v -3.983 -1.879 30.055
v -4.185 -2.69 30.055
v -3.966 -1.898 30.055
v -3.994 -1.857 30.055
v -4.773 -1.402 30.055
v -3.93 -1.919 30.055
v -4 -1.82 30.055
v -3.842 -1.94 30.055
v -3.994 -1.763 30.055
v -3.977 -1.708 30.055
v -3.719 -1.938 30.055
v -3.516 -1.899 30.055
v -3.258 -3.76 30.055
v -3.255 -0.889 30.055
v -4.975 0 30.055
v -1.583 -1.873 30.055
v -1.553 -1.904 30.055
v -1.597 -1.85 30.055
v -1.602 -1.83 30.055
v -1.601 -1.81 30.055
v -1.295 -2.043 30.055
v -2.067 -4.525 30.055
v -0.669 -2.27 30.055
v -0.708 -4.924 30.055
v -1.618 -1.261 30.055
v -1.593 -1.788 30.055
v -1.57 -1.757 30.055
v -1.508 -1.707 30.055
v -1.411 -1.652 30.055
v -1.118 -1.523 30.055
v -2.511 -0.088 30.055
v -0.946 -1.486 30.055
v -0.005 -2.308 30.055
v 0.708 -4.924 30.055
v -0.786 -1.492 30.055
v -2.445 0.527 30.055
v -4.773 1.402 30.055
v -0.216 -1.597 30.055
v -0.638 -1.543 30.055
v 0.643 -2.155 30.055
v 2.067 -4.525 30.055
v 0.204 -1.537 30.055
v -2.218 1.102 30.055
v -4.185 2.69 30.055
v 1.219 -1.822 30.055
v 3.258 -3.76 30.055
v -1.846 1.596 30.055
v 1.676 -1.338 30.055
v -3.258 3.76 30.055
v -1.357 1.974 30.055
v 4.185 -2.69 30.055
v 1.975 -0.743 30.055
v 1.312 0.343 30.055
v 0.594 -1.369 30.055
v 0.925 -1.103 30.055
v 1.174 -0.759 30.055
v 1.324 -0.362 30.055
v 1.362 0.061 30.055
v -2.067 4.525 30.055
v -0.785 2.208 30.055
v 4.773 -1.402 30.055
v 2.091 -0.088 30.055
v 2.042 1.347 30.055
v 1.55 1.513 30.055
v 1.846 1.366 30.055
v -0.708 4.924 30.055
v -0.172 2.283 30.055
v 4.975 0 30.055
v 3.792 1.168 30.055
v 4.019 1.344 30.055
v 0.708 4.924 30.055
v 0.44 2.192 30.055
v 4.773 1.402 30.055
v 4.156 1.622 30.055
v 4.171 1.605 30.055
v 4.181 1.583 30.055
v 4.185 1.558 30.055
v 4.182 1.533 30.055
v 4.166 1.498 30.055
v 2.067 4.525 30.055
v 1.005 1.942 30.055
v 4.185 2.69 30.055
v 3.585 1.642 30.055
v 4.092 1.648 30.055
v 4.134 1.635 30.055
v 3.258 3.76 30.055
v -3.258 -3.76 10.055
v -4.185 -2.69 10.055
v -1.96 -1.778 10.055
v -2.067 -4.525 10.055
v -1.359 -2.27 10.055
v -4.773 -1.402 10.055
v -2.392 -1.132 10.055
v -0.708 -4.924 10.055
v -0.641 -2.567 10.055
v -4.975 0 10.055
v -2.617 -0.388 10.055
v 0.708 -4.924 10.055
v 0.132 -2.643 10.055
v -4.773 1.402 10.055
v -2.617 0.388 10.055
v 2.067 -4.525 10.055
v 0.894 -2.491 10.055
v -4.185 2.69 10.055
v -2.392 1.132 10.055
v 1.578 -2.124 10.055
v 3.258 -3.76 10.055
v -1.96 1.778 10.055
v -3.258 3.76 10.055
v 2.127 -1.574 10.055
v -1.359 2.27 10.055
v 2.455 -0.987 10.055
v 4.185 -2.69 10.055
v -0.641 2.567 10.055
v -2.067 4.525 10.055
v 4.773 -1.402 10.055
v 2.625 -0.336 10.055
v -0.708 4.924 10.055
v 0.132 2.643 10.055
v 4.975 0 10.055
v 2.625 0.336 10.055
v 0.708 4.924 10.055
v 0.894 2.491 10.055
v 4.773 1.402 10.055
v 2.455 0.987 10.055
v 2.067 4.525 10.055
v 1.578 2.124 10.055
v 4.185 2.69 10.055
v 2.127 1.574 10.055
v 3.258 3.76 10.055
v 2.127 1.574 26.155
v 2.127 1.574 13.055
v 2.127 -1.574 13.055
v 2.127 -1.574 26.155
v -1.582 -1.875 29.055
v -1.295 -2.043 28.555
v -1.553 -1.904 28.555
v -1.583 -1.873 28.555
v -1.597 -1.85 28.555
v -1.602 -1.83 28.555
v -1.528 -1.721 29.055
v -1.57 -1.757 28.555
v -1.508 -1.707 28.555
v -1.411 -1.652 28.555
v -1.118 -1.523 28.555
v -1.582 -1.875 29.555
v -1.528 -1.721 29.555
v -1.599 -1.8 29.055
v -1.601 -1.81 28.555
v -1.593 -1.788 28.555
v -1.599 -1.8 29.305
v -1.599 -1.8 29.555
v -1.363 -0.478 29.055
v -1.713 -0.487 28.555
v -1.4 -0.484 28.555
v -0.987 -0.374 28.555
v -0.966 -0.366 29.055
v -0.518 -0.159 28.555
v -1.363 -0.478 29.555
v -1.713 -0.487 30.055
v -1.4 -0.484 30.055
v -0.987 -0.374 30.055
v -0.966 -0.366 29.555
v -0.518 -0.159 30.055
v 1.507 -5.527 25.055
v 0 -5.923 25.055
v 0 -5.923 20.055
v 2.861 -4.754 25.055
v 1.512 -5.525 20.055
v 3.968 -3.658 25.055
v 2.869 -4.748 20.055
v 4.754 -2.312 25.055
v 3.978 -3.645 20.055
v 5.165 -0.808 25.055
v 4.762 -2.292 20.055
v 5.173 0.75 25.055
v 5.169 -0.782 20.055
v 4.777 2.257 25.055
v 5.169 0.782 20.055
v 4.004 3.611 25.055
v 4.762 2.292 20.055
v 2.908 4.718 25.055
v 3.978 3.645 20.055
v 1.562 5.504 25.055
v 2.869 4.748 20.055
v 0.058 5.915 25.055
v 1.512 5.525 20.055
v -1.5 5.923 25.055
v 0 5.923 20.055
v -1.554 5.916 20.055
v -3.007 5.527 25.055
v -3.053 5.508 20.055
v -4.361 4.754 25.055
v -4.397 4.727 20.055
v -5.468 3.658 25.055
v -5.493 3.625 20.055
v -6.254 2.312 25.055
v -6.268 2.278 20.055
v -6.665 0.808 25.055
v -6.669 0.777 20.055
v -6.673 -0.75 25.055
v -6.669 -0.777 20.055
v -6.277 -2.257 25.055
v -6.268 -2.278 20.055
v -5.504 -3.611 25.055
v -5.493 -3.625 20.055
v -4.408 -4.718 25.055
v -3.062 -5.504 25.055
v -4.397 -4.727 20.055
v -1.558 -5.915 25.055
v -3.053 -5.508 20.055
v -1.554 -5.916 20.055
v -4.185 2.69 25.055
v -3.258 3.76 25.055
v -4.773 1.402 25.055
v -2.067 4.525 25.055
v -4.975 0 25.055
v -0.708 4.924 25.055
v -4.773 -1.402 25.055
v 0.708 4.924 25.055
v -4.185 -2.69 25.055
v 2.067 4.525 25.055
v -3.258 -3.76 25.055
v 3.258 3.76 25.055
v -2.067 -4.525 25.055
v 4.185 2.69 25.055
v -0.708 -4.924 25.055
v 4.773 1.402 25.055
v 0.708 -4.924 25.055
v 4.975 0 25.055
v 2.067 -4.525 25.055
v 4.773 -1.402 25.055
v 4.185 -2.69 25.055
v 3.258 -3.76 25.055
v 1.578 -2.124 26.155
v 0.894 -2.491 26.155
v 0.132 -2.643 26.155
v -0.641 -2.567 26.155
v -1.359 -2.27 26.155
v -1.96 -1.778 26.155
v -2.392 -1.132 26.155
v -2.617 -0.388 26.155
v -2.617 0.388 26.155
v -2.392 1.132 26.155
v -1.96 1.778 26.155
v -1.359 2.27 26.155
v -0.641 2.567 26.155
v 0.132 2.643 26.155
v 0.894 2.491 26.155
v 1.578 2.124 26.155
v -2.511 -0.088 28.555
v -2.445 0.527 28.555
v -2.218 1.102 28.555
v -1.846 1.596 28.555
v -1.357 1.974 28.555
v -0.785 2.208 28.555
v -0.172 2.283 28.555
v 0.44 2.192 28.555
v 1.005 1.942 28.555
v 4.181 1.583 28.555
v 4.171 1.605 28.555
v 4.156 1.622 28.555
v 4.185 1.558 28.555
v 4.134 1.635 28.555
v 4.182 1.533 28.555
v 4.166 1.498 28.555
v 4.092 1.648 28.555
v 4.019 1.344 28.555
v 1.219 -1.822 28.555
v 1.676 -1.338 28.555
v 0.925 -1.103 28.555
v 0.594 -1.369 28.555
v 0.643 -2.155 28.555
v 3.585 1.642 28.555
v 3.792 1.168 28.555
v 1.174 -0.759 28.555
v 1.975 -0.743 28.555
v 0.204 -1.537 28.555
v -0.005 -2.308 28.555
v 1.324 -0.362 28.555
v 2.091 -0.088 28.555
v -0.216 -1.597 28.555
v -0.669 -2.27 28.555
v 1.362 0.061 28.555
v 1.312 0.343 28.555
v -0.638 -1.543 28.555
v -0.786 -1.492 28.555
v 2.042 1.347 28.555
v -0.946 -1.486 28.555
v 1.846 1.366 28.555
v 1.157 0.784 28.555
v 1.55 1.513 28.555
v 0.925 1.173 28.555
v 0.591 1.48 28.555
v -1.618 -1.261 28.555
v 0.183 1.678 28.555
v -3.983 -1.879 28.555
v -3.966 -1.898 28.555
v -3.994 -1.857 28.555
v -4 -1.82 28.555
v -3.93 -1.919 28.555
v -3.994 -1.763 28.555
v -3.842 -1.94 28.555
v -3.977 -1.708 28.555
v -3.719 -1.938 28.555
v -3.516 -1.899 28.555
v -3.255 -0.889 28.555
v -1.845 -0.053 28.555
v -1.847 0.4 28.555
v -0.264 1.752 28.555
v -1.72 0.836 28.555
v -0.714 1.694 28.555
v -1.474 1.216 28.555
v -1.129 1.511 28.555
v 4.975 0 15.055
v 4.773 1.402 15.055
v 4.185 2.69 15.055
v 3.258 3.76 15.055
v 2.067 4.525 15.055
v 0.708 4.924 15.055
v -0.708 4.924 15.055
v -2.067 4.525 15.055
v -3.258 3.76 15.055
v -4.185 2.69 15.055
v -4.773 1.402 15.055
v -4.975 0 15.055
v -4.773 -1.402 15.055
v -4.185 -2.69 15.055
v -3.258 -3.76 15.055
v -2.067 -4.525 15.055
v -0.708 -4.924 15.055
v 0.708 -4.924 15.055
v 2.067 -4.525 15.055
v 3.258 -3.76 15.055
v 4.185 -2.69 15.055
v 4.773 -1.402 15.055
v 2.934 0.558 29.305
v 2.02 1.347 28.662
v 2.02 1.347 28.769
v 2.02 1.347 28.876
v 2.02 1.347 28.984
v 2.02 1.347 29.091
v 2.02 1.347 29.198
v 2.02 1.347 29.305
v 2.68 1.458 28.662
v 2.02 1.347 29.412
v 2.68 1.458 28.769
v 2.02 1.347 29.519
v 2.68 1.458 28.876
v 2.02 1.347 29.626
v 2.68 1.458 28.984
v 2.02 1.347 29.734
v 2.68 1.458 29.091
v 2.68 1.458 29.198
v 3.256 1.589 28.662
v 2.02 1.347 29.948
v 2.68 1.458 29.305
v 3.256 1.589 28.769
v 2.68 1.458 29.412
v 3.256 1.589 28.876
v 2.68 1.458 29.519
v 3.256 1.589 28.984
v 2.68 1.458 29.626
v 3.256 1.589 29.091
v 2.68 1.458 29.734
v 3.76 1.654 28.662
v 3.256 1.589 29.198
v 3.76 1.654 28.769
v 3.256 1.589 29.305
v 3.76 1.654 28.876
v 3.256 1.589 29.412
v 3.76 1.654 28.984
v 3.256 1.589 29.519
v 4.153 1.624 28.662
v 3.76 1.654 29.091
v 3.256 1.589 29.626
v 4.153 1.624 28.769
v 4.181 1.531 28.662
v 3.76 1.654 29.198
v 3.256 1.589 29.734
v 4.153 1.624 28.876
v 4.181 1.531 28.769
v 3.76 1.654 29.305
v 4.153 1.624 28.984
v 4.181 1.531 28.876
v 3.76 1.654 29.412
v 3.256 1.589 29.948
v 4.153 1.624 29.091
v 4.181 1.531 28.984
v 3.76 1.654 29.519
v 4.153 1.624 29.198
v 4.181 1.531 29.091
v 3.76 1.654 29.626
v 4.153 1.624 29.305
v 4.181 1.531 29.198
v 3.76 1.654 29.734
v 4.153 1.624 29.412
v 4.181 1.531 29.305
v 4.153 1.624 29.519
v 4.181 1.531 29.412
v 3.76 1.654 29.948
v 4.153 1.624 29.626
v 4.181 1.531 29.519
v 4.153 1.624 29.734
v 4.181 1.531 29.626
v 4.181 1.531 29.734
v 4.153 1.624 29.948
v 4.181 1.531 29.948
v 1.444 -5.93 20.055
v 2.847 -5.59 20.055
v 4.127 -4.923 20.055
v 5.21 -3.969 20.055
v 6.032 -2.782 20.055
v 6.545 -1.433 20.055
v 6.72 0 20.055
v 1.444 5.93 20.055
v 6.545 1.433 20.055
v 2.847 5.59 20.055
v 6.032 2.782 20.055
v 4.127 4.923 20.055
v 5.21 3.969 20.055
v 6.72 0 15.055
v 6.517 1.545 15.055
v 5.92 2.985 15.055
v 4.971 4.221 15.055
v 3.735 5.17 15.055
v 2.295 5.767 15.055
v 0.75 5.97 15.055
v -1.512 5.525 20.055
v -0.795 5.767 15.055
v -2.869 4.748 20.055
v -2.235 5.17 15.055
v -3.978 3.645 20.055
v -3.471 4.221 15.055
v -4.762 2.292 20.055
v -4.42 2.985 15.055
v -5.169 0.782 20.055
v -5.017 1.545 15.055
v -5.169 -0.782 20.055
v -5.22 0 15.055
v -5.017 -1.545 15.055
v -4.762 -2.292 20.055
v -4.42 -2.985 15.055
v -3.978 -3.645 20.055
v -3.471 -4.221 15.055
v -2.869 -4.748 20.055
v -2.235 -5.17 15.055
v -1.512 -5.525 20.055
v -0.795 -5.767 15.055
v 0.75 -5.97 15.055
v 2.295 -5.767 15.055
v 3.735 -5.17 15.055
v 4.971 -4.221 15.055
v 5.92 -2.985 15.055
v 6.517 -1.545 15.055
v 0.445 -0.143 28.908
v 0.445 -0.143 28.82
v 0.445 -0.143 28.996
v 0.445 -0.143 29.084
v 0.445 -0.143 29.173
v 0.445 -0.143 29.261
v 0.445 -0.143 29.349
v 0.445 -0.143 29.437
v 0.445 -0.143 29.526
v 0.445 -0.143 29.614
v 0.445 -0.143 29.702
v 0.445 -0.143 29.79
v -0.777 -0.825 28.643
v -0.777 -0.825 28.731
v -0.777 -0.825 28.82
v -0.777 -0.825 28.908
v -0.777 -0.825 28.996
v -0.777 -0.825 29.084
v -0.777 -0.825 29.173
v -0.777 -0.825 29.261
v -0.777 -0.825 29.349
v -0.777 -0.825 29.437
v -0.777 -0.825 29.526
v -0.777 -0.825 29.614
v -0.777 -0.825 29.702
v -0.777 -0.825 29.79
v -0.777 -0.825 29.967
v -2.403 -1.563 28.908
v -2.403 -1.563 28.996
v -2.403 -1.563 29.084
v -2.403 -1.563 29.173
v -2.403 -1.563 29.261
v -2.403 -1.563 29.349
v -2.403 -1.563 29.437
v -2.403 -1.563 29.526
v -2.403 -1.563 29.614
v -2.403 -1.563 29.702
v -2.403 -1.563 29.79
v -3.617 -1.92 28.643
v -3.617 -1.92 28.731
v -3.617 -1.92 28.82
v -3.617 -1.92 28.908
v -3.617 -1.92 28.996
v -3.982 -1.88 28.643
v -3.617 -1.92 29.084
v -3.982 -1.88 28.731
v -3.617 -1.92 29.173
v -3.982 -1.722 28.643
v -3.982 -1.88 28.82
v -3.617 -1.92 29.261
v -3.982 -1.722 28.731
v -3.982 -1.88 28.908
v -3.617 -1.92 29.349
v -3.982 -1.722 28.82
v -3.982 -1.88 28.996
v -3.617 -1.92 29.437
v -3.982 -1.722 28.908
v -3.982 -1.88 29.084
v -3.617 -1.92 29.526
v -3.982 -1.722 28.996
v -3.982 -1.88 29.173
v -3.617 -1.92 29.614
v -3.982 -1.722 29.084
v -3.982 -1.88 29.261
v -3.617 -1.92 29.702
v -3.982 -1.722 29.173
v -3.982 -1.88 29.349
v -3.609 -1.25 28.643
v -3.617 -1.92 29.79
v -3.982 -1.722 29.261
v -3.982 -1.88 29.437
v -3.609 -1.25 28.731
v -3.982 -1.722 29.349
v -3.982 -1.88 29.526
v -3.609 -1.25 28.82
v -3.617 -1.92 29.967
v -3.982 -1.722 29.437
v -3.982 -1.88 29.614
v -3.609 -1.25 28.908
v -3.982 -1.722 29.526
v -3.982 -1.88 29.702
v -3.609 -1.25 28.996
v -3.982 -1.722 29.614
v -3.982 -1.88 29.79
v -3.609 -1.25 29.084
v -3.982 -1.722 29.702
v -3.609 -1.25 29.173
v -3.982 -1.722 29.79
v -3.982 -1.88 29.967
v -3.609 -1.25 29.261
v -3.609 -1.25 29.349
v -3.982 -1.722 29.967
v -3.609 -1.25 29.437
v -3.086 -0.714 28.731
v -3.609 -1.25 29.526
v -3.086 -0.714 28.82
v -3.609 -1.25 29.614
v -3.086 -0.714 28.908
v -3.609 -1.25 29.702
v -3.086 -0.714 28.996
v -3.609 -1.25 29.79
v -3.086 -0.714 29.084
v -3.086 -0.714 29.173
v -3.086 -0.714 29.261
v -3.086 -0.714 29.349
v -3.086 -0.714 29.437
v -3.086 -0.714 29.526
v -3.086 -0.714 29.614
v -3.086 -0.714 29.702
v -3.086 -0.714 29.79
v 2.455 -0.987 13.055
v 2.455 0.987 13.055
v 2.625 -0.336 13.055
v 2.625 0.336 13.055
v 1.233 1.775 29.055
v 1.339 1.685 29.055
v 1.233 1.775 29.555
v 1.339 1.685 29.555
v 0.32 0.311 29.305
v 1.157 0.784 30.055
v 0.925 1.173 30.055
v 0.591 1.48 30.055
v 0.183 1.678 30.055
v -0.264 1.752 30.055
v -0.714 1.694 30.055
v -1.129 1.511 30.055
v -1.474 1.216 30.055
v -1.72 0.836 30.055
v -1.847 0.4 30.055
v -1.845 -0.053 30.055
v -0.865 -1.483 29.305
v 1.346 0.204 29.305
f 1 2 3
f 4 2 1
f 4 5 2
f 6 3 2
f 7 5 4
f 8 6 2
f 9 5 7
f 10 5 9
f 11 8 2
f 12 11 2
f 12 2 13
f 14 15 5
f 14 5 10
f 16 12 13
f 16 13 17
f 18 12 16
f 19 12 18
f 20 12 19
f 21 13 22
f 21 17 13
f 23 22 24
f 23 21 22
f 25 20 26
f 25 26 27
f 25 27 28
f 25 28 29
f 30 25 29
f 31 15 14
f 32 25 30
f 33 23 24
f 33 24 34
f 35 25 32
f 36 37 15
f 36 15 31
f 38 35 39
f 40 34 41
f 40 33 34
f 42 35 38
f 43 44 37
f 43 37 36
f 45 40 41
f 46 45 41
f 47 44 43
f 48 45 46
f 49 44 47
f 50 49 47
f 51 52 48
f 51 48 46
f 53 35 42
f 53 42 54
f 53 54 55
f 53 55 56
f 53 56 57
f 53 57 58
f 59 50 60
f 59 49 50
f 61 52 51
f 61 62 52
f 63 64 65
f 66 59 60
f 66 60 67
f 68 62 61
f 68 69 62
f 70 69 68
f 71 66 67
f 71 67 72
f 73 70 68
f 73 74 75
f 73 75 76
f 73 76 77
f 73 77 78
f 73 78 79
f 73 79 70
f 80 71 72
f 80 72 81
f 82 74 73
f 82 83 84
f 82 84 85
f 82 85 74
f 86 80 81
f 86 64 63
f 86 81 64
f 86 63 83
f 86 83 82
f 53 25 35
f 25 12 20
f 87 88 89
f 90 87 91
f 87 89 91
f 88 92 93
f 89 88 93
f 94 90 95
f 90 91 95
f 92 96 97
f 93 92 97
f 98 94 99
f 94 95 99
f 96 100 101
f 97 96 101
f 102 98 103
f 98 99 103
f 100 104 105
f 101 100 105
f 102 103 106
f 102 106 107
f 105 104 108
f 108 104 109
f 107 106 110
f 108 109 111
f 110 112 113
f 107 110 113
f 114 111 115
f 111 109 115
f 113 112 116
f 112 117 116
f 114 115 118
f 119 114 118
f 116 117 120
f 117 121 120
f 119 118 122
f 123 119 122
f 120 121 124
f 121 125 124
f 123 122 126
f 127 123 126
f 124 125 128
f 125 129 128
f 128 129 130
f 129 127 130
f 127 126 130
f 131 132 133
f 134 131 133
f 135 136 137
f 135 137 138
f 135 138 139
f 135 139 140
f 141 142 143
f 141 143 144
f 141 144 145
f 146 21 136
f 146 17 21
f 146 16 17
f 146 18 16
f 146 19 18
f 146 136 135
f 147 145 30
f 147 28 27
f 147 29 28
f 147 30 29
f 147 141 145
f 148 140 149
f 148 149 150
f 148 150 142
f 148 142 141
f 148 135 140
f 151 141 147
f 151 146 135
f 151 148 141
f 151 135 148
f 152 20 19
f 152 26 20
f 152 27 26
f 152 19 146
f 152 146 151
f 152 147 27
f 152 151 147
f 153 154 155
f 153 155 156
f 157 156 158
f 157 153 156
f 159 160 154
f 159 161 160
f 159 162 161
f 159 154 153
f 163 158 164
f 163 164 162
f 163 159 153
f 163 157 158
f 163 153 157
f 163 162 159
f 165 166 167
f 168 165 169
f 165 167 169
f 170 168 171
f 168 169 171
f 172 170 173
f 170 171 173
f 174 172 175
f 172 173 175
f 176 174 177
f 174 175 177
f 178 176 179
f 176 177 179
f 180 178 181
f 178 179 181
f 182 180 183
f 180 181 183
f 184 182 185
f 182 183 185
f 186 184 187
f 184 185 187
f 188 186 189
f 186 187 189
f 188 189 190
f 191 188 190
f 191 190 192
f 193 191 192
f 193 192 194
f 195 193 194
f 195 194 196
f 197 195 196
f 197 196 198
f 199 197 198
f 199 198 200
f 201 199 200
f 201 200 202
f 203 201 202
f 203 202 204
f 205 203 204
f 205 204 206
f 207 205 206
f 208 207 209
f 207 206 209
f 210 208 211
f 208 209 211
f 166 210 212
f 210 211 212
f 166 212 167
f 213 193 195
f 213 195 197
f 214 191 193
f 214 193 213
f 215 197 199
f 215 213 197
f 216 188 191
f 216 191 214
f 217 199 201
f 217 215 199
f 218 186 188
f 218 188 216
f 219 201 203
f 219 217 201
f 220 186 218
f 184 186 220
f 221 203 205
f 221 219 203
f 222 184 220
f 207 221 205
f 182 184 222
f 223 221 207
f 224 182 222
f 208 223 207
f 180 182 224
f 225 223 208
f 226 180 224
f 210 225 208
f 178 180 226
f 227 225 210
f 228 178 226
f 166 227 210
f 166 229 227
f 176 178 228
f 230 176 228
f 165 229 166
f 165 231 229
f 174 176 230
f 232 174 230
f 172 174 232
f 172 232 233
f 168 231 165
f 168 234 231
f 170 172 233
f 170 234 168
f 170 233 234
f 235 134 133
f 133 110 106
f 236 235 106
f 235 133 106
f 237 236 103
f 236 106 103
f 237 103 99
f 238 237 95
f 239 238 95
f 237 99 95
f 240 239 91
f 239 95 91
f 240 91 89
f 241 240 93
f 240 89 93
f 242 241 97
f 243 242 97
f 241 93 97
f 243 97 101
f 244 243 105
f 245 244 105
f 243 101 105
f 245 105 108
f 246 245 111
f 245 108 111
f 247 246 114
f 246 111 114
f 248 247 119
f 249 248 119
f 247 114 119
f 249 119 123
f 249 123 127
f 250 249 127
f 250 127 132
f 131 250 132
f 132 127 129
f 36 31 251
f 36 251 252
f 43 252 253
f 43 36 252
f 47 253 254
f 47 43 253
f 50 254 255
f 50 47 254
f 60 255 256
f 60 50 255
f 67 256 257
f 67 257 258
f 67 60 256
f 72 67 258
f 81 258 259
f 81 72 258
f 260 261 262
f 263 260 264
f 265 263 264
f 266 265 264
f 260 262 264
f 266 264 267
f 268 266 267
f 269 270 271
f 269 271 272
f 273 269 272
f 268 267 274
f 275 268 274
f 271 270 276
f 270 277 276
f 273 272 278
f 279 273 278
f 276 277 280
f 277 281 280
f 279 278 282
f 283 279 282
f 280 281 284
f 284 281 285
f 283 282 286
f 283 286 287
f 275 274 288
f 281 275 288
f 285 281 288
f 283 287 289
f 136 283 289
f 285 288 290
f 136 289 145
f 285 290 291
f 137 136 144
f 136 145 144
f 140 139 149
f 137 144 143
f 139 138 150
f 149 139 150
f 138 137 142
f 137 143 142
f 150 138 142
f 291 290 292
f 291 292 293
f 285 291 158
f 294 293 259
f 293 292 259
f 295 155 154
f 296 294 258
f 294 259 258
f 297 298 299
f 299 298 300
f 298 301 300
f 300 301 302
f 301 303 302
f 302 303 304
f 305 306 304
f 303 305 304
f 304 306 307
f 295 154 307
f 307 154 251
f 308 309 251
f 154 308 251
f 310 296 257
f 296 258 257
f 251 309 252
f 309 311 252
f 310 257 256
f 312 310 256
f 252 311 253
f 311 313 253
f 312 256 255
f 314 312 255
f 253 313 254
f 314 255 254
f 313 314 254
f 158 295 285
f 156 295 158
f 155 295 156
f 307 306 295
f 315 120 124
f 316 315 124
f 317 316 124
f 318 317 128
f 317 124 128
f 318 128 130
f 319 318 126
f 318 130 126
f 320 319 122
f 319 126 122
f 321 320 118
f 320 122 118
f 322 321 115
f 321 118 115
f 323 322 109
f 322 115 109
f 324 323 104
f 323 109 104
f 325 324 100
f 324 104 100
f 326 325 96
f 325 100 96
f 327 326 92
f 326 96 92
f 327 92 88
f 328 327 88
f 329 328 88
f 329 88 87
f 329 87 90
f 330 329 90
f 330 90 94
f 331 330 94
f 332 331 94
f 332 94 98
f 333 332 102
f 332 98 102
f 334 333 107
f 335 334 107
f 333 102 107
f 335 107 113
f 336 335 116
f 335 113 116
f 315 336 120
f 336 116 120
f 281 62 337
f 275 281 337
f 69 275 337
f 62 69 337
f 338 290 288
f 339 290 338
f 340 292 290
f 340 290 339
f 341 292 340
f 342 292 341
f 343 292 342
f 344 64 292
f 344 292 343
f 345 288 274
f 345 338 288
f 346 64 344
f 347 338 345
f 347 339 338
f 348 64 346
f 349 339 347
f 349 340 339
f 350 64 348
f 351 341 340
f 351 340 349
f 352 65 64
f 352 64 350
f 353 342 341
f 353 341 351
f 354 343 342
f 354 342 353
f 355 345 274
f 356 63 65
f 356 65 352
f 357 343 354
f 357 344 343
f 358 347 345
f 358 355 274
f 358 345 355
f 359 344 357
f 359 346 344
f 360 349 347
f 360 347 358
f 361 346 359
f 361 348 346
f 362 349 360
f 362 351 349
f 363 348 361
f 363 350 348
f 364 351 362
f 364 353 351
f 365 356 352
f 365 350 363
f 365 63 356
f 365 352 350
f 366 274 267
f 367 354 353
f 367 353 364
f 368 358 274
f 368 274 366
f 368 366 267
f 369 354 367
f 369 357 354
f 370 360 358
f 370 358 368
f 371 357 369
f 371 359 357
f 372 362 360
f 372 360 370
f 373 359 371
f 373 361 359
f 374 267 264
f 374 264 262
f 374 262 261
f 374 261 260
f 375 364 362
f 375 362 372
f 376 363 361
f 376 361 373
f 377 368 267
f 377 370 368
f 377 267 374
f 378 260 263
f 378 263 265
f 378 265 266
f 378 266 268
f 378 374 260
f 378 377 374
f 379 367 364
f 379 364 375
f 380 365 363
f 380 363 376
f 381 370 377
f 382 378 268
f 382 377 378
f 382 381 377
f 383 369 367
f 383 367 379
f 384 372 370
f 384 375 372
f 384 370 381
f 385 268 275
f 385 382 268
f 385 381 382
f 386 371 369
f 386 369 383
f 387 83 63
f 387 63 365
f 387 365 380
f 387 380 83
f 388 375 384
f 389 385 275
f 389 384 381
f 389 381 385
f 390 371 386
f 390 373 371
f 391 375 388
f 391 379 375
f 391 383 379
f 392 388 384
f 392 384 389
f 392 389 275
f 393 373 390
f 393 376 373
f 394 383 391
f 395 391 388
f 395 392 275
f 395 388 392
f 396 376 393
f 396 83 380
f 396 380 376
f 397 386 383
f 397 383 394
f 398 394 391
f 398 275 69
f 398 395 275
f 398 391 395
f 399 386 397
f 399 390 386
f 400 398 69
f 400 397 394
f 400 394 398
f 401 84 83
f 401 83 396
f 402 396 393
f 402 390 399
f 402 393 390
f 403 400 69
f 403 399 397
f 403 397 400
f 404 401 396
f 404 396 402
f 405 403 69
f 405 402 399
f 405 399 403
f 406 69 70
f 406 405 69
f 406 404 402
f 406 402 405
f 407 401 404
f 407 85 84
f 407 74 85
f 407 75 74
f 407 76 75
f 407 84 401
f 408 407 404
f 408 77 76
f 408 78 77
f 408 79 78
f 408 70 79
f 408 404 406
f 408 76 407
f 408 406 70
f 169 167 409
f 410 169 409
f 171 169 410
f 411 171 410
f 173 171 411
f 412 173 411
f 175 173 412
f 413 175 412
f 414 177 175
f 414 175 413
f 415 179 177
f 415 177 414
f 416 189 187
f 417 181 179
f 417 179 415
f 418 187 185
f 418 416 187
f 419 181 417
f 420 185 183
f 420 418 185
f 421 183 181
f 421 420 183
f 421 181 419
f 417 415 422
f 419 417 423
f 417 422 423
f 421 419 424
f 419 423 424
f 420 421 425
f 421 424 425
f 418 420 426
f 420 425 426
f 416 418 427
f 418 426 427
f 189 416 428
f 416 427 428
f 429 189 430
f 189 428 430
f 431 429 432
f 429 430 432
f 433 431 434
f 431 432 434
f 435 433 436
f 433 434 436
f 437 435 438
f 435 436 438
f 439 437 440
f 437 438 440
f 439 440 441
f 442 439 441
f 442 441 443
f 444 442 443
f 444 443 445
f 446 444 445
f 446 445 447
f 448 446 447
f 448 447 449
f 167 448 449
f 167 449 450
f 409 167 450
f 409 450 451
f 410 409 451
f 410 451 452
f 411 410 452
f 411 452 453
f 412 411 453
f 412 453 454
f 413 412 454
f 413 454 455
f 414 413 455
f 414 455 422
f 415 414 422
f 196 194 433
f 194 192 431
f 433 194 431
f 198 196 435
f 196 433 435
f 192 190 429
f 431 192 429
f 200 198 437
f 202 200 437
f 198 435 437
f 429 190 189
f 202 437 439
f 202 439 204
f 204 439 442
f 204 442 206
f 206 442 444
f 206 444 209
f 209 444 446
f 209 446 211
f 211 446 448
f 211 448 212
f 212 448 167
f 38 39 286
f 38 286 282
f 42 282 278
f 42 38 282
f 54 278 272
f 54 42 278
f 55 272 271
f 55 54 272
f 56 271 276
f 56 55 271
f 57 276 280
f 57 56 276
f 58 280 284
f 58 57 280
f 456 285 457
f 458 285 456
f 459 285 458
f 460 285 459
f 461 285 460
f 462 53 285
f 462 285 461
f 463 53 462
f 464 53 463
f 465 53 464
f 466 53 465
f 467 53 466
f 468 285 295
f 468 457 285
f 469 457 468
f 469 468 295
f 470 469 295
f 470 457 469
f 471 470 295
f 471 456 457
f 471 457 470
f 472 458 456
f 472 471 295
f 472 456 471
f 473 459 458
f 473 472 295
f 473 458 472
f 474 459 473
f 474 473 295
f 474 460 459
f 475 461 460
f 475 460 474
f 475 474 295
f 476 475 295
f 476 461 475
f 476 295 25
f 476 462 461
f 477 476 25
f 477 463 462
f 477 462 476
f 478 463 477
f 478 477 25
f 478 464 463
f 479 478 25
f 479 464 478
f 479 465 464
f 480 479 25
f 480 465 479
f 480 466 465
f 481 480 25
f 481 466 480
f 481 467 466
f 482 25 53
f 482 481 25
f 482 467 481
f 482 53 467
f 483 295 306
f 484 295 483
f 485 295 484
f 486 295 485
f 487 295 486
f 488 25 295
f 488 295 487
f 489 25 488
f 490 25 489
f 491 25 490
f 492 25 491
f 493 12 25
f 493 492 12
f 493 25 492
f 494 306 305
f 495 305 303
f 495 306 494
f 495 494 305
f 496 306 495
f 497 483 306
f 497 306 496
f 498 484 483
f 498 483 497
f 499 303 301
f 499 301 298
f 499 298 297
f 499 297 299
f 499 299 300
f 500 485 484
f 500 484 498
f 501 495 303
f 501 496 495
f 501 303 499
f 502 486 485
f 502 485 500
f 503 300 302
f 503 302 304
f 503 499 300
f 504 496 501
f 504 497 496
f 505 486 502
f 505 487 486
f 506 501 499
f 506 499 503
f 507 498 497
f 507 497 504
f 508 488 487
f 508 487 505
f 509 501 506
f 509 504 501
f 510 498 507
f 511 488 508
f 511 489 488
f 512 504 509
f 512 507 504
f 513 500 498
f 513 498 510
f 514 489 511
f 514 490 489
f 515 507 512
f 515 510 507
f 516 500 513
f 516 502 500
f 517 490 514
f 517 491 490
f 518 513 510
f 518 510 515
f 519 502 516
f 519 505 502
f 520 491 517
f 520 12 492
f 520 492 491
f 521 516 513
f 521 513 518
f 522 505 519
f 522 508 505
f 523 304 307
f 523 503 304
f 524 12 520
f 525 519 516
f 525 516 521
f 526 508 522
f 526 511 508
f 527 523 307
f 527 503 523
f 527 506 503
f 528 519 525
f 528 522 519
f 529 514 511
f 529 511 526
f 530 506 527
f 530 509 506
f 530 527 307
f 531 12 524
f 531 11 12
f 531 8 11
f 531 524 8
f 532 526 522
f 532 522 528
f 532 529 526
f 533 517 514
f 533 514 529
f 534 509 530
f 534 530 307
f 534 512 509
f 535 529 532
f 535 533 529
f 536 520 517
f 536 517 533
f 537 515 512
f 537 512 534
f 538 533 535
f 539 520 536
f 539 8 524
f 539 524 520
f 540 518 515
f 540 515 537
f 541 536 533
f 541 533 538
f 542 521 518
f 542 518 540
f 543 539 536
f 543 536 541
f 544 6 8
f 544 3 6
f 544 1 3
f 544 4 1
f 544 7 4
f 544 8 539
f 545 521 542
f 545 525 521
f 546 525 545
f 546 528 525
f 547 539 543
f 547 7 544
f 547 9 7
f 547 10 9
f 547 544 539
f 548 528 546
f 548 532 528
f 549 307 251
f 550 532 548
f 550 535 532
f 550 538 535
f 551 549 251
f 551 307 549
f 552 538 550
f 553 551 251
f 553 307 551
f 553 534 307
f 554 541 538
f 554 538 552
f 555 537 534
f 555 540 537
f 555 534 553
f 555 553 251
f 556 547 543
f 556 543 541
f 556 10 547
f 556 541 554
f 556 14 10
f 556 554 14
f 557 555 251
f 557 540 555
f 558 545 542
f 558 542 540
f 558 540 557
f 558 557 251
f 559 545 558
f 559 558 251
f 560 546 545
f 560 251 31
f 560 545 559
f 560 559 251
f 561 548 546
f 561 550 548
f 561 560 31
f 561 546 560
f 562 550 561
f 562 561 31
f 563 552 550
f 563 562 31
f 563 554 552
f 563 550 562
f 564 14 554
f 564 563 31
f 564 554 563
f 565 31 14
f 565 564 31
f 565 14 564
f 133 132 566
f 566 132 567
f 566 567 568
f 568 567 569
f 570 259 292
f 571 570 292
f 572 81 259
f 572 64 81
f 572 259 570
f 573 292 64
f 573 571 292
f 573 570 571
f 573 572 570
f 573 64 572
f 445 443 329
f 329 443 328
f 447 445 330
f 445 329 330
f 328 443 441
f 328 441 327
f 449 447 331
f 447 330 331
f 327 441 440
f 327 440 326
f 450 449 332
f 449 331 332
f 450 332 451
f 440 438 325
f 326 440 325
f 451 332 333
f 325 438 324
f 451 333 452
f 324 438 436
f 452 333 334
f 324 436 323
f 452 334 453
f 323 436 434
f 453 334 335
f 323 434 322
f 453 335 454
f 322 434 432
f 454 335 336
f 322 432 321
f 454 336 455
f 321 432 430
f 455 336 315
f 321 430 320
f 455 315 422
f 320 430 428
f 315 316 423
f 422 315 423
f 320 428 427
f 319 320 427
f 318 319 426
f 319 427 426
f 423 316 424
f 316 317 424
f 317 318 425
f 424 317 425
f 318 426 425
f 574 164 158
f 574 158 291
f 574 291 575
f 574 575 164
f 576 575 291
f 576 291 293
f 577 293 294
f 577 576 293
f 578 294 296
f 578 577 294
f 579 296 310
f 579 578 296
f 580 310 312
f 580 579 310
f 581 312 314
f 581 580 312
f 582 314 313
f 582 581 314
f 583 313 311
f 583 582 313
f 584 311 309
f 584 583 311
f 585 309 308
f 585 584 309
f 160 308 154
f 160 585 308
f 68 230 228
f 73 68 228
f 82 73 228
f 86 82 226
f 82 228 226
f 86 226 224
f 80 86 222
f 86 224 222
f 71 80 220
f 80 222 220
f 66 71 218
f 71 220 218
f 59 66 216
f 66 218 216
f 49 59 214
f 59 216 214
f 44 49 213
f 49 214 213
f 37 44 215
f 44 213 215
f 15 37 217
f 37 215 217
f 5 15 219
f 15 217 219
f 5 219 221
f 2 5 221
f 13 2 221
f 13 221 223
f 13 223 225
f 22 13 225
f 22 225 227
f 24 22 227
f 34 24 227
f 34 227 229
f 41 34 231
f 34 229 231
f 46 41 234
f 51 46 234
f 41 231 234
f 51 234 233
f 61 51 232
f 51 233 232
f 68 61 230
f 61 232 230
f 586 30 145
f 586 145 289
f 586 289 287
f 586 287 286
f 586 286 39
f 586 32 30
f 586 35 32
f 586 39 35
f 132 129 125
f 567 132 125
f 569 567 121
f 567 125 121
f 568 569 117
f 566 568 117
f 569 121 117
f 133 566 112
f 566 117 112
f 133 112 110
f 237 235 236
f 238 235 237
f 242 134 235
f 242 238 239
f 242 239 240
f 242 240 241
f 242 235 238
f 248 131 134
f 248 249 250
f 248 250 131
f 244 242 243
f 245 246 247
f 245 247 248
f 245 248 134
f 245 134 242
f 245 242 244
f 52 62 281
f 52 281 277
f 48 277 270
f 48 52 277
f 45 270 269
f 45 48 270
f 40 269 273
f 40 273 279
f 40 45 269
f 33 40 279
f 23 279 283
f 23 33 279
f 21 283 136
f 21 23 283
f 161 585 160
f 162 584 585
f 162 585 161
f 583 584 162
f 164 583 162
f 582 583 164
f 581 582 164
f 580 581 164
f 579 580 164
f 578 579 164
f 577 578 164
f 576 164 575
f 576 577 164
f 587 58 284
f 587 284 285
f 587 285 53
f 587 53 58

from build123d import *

# Parameters (mm, degrees)
SKETCH2_R           = 4.975
BOSS_EXTRUDE1_DEPTH = 5
SKETCH3_R           = 5.97
BOSS_EXTRUDE2_DEPTH = 5
SKETCH5_R           = 5.97
BOSS_EXTRUDE3_DEPTH = 5
SKETCH6_R           = 4.975
BOSS_EXTRUDE4_DEPTH = 5
SKETCH8_R           = 2.698107805
BOSS_EXTRUDE5_DEPTH = 4.6
CUT_EXTRUDE3_DEPTH  = 16.1
SKETCH12_R          = 2.646
CUT_EXTRUDE4_DEPTH  = 3
CUT_EXTRUDE5_DEPTH  = 1.5


with BuildPart() as part:
    # Sketch2 → Boss-Extrude1 (new body)
    with BuildSketch(Plane.XY.offset(10.054948089)):
        Circle(SKETCH2_R)
        with BuildLine():
            Line((2, 1.5), (2, -1.5))
            ThreePointArc((2, -1.5), (-2.5, 0), (2, 1.5))
        make_face(mode=Mode.SUBTRACT)
    extrude(amount=BOSS_EXTRUDE1_DEPTH)

    # Sketch3 → Boss-Extrude2 (add)
    with BuildSketch(Plane.XY.offset(15.054948089)):
        with Locations((0.75, 0)):
            Circle(SKETCH3_R)
        with BuildLine():
            Line((2, 1.5), (2, -1.5))
            ThreePointArc((2, -1.5), (-2.5, -1e-09), (2, 1.5))
        make_face(mode=Mode.SUBTRACT)
    extrude(amount=BOSS_EXTRUDE2_DEPTH)

    # Sketch5 → Boss-Extrude3 (add)
    with BuildSketch(Plane.XY.offset(20.054948089)):
        with Locations(Location((-0.75, 0, 0), (0, 0, 277.217031551))):
            Circle(SKETCH5_R)
        with BuildLine():
            Line((2, 1.5), (2, -1.5))
            ThreePointArc((2, -1.5), (-2.5, 0), (2, 1.5))
        make_face(mode=Mode.SUBTRACT)
    extrude(amount=BOSS_EXTRUDE3_DEPTH)

    # Sketch6 → Boss-Extrude4 (add)
    with BuildSketch(Plane.XY.offset(25.054948089)):
        Circle(SKETCH6_R)
        with BuildLine():
            Line((2, 1.5), (2, -1.5))
            ThreePointArc((2, -1.5), (-2.5, 0), (2, 1.5))
        make_face(mode=Mode.SUBTRACT)
    extrude(amount=BOSS_EXTRUDE4_DEPTH)

    # Sketch8 → Boss-Extrude5 (add)
    with BuildSketch(Plane.XY.offset(25.454948089)):
        Circle(SKETCH8_R)
    extrude(amount=BOSS_EXTRUDE5_DEPTH)

    # Sketch10 → Cut-Extrude3 (cut)
    with BuildSketch(Plane(origin=(0, 0, 10.054948089), x_dir=(-1, 0, 0), z_dir=(0, 0, -1))):
        with BuildLine():
            Line((-2.127176471, 1.57366968), (-2.127176471, -1.57366968))
            ThreePointArc((-2.127176471, -1.57366968), (2.646, 0), (-2.127176471, 1.57366968))
        make_face()
    extrude(amount=-CUT_EXTRUDE3_DEPTH, mode=Mode.SUBTRACT)

    # Sketch12 → Cut-Extrude4 (cut)
    with BuildSketch(Plane(origin=(0, 0, 10.054948089), x_dir=(-1, 0, 0), z_dir=(0, 0, -1))):
        Circle(SKETCH12_R)
    extrude(amount=-CUT_EXTRUDE4_DEPTH, mode=Mode.SUBTRACT)

    # Sketch13 → Cut-Extrude5 (cut)
    with BuildSketch(Plane.XY.offset(30.054948089)):
        with BuildLine():
            ThreePointArc((-2.51116552, -0.087954636), (-1.357302284, 1.973549468), (1.004944259, 1.942072291))
            add(Edge.make_bspline(
                [(1.004944259, 1.942072291), (1.080556299, 1.886286139), (1.19790515, 1.808024326), (1.373021318, 1.656234404), (1.47030803, 1.558406007), (1.550477263, 1.513006562)],
                knots=[0, 0, 0, 0, 0.406231217, 0.607035645, 1, 1, 1, 1], degree=3))
            add(Edge.make_bspline(
                [(1.550477263, 1.513006562), (1.635864774, 1.474239987), (1.773010843, 1.366273459), (2.039141531, 1.334356693), (2.331882187, 1.388131663), (2.66672311, 1.446751803), (2.982241637, 1.541137483), (3.279025568, 1.591865164), (3.523767348, 1.639570409), (3.784019221, 1.657387797), (3.969776334, 1.659661053), (4.168941475, 1.644062658), (4.202381272, 1.52843867), (4.126318671, 1.44725911), (4.010429706, 1.335902318), (3.968265182, 1.291154175), (3.792262006, 1.168081192)],
                knots=[0, 0, 0, 0, 0.086753896, 0.154448198, 0.238460485, 0.359650414, 0.46636505, 0.540243649, 0.635674639, 0.69606208, 0.776341506, 0.817536165, 0.854232706, 0.891997853, 0.906574583, 1, 1, 1, 1], degree=3))
            add(Edge.make_bspline(
                [(2.091354428, -0.087954636), (2.926147793, 0.575225687), (3.792262006, 1.168081192)],
                knots=[0, 0, 0, 1, 1, 1], degree=2))
            ThreePointArc((2.091354428, -0.087954636), (0.943093758, -2.009095653), (-1.294793502, -2.042948055))
            add(Edge.make_bspline(
                [(-1.294793502, -2.042948055), (-1.746909796, -1.848672711), (-1.711703775, -1.762613123), (-1.117517562, -1.523273653)],
                knots=[0, 0, 0, 0, 1, 1, 1, 1], degree=3))
            add(Edge.make_bspline(
                [(-1.117517562, -1.523273653), (-0.851635042, -1.433760086), (-0.637638887, -1.542714277)],
                knots=[0, 0, 0, 1, 1, 1], degree=2))
            ThreePointArc((-0.637638887, -1.542714277), (0.768418454, -1.247154446), (1.362404266, 0.061101538))
            add(Edge.make_bspline(
                [(1.362404266, 0.061101538), (1.355019388, 0.205736583), (1.311882289, 0.343336372)],
                knots=[0, 0, 0, 1, 1, 1], degree=2))
            add(Edge.make_bspline(
                [(1.311882289, 0.343336372), (1.271394274, 0.321666217), (0.98055525, 0.164223835), (0.484149511, -0.131008667), (-0.185861153, -0.47298164), (-0.847852238, -0.872955403), (-1.568325935, -1.264471006), (-2.337842685, -1.536065016), (-3.003283347, -1.787232277), (-3.502067412, -1.898250422), (-3.821928849, -1.960496005), (-4.017644788, -1.891018555), (-3.987917105, -1.67782918), (-3.819171551, -1.496110904), (-3.60958725, -1.238739607), (-3.341385255, -0.983372917), (-3.09159848, -0.713615899), (-2.794092314, -0.437511254), (-2.628823727, -0.204972872), (-2.51116552, -0.087954636)],
                knots=[0.23960858, 0.23960858, 0.23960858, 0.23960858, 0.252432001, 0.331936596, 0.400251659, 0.461905574, 0.547436375, 0.628008605, 0.68882094, 0.745646596, 0.769268725, 0.780800749, 0.795535828, 0.817809693, 0.851462573, 0.887178783, 0.921045432, 0.953843573, 1, 1, 1, 1], degree=3))
        make_face()
        with BuildLine():
            ThreePointArc((1.157395644, 0.783657031), (-0.928142572, 1.617548229), (-1.712921676, -0.486962626))
            add(Edge.make_bspline(
                [(-1.712921676, -0.486962626), (-1.384473336, -0.532536822), (-0.992466447, -0.411621309), (-0.517874245, -0.15891637)],
                knots=[0, 0, 0, 0, 1, 1, 1, 1], degree=3))
            add(Edge.make_bspline(
                [(-0.517874245, -0.15891637), (0.320919337, 0.310316941), (1.157395644, 0.783657031)],
                knots=[0, 0, 0, 1, 1, 1], degree=2))
        make_face(mode=Mode.SUBTRACT)
    extrude(amount=-CUT_EXTRUDE5_DEPTH, mode=Mode.SUBTRACT)


solid = part.part
